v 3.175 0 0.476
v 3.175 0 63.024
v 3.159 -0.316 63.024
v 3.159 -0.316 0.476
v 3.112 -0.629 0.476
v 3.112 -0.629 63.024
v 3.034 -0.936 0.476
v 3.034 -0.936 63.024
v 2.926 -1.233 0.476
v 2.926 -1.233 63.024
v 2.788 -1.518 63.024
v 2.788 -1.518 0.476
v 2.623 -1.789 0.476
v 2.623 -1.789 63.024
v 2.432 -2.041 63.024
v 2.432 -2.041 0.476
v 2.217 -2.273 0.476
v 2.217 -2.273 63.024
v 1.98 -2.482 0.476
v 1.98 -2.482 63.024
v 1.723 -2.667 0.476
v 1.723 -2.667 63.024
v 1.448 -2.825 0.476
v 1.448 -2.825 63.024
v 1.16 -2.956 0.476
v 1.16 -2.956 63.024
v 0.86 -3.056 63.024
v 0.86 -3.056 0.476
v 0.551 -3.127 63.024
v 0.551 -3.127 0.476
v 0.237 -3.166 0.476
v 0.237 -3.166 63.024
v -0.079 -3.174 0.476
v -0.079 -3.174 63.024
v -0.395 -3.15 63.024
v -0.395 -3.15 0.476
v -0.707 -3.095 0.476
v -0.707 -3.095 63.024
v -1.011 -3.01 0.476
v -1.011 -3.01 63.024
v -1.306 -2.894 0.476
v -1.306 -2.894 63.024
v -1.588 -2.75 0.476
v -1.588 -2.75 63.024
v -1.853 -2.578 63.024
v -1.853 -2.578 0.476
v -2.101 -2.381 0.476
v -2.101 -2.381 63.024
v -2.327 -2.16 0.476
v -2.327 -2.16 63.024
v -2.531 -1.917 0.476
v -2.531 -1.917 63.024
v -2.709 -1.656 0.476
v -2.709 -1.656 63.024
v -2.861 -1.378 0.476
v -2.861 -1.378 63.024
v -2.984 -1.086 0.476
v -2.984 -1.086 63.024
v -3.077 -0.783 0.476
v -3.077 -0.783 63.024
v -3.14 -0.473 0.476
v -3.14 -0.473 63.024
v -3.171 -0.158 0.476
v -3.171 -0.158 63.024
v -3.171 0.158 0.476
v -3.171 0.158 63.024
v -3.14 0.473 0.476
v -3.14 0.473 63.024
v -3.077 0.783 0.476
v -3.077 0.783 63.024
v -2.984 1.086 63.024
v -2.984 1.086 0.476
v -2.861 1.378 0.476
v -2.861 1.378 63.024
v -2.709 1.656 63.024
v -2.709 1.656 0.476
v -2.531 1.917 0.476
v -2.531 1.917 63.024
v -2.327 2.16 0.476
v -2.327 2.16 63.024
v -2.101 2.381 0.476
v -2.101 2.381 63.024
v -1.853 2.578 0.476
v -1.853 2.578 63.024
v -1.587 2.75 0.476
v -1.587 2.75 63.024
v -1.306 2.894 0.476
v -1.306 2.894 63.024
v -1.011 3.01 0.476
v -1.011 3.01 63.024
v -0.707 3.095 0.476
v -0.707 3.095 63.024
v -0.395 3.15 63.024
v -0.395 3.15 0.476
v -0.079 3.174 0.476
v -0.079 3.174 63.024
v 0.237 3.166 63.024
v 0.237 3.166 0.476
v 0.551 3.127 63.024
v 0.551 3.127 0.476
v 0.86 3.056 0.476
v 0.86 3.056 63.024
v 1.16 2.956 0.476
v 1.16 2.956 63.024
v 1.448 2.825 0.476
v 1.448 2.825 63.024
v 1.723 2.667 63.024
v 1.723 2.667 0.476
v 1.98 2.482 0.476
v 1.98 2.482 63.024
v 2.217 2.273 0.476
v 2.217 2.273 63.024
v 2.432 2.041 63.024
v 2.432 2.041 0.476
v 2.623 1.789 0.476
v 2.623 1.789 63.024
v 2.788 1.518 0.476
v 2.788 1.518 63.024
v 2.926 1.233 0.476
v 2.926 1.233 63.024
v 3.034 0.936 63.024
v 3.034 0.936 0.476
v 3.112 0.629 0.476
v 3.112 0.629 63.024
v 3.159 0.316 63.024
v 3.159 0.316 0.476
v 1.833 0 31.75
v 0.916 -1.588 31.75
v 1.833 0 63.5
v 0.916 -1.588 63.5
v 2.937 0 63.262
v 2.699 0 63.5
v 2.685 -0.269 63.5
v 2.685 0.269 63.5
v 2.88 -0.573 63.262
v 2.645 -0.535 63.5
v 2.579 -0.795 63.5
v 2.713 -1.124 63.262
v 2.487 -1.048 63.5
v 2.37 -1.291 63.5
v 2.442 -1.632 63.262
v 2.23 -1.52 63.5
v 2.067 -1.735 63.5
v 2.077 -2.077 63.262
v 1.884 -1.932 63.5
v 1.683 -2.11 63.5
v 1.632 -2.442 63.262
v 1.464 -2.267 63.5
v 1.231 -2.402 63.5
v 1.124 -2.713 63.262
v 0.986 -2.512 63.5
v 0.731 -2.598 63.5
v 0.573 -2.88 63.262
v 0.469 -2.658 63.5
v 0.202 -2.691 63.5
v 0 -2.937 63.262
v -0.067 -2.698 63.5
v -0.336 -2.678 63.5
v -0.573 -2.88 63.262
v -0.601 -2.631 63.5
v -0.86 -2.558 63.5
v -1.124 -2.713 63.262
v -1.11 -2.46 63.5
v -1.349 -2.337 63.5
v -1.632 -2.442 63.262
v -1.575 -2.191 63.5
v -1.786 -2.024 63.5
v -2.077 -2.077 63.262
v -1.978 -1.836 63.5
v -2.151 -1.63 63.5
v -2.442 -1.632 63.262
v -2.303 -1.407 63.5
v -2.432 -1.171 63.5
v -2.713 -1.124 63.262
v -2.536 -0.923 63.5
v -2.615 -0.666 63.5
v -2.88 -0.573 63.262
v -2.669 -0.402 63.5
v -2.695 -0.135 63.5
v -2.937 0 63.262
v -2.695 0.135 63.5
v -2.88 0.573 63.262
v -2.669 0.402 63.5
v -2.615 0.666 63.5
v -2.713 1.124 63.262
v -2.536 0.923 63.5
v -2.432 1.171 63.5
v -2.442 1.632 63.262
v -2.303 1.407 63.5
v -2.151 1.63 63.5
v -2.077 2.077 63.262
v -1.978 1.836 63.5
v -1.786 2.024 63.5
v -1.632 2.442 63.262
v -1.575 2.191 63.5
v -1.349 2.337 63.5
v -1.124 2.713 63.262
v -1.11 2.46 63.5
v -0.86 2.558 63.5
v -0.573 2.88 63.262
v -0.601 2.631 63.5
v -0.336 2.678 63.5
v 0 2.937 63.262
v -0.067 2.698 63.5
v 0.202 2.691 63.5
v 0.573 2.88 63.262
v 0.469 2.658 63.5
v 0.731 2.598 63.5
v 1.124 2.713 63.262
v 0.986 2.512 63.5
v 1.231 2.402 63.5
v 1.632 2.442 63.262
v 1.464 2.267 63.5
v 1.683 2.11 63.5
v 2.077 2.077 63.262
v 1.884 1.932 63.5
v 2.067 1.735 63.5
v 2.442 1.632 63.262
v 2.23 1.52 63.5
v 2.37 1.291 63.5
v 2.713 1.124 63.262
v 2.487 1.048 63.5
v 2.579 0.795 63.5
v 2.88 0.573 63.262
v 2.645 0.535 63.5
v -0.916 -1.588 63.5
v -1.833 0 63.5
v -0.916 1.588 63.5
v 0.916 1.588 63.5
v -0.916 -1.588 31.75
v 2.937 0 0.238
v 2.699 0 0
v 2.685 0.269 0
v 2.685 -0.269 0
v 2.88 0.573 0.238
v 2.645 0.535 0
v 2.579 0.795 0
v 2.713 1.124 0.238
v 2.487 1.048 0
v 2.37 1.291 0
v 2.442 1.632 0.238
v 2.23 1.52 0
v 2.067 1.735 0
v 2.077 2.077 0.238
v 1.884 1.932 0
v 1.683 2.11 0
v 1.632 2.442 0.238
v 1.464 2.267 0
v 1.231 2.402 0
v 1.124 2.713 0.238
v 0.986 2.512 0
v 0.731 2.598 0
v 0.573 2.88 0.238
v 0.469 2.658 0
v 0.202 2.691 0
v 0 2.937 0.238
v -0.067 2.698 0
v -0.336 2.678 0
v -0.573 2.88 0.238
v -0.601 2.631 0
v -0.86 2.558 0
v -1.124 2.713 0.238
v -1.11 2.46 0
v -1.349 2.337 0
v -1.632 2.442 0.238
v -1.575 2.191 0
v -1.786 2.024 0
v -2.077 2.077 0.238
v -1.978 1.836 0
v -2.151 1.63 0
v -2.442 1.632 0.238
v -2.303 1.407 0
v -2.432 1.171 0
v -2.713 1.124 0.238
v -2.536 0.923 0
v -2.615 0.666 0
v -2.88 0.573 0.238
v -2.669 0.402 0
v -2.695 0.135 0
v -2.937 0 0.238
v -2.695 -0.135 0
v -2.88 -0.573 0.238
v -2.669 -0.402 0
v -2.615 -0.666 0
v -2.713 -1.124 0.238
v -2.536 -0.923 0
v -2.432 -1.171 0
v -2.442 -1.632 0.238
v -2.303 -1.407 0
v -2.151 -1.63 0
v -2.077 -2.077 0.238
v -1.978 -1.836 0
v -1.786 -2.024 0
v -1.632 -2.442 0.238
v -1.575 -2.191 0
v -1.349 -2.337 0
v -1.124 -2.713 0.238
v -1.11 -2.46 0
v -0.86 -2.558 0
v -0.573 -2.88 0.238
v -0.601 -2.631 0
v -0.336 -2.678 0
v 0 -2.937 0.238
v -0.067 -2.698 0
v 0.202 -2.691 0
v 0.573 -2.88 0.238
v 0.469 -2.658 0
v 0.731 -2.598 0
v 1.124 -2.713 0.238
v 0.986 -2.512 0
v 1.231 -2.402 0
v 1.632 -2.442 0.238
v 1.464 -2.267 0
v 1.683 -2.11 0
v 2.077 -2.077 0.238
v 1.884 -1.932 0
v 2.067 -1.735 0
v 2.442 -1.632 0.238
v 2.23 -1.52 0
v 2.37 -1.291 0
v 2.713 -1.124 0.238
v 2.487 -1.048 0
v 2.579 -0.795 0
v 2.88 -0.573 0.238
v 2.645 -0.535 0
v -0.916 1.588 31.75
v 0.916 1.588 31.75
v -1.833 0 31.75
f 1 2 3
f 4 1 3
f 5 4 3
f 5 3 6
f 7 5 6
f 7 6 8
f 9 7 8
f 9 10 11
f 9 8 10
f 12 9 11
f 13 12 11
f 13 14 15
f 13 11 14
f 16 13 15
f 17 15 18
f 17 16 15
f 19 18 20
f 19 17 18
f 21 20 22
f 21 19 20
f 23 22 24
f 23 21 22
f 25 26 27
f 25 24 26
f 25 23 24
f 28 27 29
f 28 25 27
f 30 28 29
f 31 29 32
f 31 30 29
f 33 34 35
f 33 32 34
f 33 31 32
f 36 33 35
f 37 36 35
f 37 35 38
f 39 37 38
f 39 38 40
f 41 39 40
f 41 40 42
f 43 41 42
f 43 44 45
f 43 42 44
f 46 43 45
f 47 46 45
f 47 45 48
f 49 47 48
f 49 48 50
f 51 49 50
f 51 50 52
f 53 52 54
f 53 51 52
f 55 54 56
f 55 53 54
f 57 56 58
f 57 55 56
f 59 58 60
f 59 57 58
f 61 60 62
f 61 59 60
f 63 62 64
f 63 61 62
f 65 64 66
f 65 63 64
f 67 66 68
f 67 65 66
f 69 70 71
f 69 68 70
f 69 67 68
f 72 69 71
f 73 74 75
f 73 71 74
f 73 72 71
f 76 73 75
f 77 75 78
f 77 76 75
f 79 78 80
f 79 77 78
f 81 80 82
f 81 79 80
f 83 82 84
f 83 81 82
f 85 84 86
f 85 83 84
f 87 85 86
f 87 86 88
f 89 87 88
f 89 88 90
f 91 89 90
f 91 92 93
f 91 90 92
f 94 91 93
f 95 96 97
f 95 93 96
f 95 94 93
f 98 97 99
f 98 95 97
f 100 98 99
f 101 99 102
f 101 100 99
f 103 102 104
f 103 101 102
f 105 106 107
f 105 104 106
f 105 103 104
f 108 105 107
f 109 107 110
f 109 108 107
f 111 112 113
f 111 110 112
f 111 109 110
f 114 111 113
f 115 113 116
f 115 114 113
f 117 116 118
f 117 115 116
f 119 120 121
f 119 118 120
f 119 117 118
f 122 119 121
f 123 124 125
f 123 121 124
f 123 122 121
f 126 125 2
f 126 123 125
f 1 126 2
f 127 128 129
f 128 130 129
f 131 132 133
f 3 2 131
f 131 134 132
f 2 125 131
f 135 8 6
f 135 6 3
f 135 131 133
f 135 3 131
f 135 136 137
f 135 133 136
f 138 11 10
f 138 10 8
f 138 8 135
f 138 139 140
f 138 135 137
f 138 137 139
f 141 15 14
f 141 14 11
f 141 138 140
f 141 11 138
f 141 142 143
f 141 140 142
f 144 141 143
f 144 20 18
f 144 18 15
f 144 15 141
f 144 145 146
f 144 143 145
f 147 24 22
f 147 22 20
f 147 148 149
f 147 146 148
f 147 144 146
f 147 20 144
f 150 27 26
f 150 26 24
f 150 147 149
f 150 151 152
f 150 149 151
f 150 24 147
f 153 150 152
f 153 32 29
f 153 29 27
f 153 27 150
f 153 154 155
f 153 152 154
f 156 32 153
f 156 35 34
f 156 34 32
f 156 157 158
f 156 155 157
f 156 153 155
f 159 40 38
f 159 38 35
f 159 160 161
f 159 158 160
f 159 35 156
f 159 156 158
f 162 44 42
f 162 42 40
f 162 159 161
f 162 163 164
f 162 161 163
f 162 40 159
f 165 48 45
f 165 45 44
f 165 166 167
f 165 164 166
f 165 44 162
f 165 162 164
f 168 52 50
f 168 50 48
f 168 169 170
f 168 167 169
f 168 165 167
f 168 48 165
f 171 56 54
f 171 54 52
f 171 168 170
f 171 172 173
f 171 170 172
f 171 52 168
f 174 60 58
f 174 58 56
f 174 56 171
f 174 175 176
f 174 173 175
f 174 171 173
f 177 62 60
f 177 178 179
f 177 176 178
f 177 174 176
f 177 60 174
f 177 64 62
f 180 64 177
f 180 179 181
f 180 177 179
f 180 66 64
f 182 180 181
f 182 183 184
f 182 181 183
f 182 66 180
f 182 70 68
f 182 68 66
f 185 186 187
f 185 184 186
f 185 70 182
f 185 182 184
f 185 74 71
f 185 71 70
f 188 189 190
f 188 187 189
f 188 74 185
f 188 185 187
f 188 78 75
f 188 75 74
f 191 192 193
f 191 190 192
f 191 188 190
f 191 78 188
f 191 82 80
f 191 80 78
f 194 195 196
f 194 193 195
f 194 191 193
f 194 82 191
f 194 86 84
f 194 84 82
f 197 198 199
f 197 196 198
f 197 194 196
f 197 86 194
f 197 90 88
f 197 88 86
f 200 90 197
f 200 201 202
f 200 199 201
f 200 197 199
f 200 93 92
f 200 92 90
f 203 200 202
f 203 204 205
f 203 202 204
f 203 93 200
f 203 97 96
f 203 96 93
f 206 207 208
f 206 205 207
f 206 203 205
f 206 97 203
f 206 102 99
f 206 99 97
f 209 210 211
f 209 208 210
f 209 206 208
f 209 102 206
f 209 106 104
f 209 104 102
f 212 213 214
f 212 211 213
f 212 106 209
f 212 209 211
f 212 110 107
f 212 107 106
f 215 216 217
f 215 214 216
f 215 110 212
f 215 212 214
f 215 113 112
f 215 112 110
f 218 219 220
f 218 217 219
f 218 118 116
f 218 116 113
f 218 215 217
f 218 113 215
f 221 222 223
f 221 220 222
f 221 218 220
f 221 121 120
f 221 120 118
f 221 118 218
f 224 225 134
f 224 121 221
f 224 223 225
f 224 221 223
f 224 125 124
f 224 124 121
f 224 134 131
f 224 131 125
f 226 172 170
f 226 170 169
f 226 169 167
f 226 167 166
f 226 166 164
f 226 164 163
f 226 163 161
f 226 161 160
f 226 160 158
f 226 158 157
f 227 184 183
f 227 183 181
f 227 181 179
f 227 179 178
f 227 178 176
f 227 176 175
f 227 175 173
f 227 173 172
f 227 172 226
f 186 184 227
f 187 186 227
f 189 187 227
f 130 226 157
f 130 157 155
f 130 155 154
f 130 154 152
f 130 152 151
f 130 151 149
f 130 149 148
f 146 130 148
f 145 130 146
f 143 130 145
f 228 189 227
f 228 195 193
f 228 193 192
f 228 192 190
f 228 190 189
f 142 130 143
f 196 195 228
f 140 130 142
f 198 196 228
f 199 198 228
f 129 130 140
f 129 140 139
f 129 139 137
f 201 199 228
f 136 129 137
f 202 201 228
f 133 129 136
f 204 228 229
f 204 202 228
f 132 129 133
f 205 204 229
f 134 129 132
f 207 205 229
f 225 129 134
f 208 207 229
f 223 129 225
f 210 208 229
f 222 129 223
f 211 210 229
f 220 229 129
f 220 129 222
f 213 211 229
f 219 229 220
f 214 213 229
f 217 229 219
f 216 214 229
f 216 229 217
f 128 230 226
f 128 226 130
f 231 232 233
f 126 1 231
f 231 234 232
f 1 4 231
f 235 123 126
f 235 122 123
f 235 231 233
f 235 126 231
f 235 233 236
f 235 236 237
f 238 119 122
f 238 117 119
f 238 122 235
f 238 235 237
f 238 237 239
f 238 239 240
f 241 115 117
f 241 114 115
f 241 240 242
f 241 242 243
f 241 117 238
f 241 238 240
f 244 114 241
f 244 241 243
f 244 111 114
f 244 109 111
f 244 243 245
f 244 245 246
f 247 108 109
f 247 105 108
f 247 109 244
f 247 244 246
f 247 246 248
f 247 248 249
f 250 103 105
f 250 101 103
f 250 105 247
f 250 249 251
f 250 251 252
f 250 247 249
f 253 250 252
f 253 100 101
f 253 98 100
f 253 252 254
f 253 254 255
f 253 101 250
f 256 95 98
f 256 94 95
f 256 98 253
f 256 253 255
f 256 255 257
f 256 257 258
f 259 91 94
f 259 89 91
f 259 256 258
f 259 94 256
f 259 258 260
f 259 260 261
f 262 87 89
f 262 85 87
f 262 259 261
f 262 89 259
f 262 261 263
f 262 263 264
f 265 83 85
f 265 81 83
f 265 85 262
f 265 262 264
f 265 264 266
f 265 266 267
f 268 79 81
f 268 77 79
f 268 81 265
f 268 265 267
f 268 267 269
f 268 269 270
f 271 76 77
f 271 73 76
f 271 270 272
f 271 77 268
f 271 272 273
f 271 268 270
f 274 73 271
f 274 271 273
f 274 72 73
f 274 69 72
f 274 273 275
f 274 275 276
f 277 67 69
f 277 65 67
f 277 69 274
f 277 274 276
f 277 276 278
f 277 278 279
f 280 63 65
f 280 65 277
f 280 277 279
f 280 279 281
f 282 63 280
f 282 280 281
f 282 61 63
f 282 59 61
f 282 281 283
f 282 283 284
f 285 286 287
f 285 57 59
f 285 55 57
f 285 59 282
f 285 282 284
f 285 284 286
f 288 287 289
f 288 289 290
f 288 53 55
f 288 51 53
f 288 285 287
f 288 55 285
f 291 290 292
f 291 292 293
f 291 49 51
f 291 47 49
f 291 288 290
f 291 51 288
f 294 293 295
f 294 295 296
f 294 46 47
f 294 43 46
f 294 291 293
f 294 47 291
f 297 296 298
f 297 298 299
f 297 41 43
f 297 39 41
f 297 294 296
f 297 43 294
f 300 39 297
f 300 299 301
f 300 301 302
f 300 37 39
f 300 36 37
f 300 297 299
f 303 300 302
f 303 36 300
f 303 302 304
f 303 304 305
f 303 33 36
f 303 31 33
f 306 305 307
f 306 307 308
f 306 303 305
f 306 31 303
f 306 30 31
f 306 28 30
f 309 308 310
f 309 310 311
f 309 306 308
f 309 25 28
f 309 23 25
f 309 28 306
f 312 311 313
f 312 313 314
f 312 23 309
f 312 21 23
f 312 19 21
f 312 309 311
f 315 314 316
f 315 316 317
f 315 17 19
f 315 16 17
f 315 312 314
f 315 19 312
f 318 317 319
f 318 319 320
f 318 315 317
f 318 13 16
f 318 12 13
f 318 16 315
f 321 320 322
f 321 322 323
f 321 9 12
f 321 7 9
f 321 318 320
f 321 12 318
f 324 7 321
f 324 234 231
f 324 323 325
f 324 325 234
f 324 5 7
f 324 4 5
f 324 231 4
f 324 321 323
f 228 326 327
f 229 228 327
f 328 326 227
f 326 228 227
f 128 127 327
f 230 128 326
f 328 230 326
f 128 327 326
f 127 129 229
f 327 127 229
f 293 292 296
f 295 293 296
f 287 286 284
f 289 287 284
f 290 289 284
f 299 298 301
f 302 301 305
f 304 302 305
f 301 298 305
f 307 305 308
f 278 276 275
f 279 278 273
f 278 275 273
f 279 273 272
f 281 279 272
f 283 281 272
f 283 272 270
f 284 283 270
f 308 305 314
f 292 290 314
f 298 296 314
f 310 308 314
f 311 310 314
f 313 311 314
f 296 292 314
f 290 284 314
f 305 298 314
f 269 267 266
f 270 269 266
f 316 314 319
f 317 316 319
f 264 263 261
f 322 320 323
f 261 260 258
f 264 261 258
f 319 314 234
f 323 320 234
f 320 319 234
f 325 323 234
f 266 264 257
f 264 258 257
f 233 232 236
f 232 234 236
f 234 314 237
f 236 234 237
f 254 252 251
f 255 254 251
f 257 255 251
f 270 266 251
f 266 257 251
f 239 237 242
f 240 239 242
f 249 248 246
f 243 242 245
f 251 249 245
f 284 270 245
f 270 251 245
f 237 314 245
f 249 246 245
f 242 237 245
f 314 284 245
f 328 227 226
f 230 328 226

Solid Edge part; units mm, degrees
sketch "Sketch1" plane through (0, 0, 0) normal (0, 0, 1) x (1, 0, 0)
  circle A0 centre (0, 0) radius 3.175
  dimension "D1" = 6.35
extrude "Protrusion1" add sketch "Sketch1" along normal blind 63.5
chamfer "Chamfer1" distance 0.4762 angle 45 2 edges at (-3.175, 0, 0) (-3.175, 0, 63.5)
sketch "Sketch2" plane through (0, 0, 63.5) normal (0, 0, 1) x (1, 0, 0)
  line L0 (-0.9165, 1.5875) -> (0.9165, 1.5875)
  line L1 (1.8331, 0) -> (0.9165, 1.5875)
  line L2 (0.9165, -1.5875) -> (1.8331, 0)
  line L3 (-0.9165, -1.5875) -> (0.9165, -1.5875)
  line L4 (-1.8331, 0) -> (-0.9165, -1.5875)
  line L5 (-0.9165, 1.5875) -> (-1.8331, 0)
  dimension "D1" = 3.175
extrude "Cutout1" cut sketch "Sketch2" against normal blind 31.75
properties part number "162158"
